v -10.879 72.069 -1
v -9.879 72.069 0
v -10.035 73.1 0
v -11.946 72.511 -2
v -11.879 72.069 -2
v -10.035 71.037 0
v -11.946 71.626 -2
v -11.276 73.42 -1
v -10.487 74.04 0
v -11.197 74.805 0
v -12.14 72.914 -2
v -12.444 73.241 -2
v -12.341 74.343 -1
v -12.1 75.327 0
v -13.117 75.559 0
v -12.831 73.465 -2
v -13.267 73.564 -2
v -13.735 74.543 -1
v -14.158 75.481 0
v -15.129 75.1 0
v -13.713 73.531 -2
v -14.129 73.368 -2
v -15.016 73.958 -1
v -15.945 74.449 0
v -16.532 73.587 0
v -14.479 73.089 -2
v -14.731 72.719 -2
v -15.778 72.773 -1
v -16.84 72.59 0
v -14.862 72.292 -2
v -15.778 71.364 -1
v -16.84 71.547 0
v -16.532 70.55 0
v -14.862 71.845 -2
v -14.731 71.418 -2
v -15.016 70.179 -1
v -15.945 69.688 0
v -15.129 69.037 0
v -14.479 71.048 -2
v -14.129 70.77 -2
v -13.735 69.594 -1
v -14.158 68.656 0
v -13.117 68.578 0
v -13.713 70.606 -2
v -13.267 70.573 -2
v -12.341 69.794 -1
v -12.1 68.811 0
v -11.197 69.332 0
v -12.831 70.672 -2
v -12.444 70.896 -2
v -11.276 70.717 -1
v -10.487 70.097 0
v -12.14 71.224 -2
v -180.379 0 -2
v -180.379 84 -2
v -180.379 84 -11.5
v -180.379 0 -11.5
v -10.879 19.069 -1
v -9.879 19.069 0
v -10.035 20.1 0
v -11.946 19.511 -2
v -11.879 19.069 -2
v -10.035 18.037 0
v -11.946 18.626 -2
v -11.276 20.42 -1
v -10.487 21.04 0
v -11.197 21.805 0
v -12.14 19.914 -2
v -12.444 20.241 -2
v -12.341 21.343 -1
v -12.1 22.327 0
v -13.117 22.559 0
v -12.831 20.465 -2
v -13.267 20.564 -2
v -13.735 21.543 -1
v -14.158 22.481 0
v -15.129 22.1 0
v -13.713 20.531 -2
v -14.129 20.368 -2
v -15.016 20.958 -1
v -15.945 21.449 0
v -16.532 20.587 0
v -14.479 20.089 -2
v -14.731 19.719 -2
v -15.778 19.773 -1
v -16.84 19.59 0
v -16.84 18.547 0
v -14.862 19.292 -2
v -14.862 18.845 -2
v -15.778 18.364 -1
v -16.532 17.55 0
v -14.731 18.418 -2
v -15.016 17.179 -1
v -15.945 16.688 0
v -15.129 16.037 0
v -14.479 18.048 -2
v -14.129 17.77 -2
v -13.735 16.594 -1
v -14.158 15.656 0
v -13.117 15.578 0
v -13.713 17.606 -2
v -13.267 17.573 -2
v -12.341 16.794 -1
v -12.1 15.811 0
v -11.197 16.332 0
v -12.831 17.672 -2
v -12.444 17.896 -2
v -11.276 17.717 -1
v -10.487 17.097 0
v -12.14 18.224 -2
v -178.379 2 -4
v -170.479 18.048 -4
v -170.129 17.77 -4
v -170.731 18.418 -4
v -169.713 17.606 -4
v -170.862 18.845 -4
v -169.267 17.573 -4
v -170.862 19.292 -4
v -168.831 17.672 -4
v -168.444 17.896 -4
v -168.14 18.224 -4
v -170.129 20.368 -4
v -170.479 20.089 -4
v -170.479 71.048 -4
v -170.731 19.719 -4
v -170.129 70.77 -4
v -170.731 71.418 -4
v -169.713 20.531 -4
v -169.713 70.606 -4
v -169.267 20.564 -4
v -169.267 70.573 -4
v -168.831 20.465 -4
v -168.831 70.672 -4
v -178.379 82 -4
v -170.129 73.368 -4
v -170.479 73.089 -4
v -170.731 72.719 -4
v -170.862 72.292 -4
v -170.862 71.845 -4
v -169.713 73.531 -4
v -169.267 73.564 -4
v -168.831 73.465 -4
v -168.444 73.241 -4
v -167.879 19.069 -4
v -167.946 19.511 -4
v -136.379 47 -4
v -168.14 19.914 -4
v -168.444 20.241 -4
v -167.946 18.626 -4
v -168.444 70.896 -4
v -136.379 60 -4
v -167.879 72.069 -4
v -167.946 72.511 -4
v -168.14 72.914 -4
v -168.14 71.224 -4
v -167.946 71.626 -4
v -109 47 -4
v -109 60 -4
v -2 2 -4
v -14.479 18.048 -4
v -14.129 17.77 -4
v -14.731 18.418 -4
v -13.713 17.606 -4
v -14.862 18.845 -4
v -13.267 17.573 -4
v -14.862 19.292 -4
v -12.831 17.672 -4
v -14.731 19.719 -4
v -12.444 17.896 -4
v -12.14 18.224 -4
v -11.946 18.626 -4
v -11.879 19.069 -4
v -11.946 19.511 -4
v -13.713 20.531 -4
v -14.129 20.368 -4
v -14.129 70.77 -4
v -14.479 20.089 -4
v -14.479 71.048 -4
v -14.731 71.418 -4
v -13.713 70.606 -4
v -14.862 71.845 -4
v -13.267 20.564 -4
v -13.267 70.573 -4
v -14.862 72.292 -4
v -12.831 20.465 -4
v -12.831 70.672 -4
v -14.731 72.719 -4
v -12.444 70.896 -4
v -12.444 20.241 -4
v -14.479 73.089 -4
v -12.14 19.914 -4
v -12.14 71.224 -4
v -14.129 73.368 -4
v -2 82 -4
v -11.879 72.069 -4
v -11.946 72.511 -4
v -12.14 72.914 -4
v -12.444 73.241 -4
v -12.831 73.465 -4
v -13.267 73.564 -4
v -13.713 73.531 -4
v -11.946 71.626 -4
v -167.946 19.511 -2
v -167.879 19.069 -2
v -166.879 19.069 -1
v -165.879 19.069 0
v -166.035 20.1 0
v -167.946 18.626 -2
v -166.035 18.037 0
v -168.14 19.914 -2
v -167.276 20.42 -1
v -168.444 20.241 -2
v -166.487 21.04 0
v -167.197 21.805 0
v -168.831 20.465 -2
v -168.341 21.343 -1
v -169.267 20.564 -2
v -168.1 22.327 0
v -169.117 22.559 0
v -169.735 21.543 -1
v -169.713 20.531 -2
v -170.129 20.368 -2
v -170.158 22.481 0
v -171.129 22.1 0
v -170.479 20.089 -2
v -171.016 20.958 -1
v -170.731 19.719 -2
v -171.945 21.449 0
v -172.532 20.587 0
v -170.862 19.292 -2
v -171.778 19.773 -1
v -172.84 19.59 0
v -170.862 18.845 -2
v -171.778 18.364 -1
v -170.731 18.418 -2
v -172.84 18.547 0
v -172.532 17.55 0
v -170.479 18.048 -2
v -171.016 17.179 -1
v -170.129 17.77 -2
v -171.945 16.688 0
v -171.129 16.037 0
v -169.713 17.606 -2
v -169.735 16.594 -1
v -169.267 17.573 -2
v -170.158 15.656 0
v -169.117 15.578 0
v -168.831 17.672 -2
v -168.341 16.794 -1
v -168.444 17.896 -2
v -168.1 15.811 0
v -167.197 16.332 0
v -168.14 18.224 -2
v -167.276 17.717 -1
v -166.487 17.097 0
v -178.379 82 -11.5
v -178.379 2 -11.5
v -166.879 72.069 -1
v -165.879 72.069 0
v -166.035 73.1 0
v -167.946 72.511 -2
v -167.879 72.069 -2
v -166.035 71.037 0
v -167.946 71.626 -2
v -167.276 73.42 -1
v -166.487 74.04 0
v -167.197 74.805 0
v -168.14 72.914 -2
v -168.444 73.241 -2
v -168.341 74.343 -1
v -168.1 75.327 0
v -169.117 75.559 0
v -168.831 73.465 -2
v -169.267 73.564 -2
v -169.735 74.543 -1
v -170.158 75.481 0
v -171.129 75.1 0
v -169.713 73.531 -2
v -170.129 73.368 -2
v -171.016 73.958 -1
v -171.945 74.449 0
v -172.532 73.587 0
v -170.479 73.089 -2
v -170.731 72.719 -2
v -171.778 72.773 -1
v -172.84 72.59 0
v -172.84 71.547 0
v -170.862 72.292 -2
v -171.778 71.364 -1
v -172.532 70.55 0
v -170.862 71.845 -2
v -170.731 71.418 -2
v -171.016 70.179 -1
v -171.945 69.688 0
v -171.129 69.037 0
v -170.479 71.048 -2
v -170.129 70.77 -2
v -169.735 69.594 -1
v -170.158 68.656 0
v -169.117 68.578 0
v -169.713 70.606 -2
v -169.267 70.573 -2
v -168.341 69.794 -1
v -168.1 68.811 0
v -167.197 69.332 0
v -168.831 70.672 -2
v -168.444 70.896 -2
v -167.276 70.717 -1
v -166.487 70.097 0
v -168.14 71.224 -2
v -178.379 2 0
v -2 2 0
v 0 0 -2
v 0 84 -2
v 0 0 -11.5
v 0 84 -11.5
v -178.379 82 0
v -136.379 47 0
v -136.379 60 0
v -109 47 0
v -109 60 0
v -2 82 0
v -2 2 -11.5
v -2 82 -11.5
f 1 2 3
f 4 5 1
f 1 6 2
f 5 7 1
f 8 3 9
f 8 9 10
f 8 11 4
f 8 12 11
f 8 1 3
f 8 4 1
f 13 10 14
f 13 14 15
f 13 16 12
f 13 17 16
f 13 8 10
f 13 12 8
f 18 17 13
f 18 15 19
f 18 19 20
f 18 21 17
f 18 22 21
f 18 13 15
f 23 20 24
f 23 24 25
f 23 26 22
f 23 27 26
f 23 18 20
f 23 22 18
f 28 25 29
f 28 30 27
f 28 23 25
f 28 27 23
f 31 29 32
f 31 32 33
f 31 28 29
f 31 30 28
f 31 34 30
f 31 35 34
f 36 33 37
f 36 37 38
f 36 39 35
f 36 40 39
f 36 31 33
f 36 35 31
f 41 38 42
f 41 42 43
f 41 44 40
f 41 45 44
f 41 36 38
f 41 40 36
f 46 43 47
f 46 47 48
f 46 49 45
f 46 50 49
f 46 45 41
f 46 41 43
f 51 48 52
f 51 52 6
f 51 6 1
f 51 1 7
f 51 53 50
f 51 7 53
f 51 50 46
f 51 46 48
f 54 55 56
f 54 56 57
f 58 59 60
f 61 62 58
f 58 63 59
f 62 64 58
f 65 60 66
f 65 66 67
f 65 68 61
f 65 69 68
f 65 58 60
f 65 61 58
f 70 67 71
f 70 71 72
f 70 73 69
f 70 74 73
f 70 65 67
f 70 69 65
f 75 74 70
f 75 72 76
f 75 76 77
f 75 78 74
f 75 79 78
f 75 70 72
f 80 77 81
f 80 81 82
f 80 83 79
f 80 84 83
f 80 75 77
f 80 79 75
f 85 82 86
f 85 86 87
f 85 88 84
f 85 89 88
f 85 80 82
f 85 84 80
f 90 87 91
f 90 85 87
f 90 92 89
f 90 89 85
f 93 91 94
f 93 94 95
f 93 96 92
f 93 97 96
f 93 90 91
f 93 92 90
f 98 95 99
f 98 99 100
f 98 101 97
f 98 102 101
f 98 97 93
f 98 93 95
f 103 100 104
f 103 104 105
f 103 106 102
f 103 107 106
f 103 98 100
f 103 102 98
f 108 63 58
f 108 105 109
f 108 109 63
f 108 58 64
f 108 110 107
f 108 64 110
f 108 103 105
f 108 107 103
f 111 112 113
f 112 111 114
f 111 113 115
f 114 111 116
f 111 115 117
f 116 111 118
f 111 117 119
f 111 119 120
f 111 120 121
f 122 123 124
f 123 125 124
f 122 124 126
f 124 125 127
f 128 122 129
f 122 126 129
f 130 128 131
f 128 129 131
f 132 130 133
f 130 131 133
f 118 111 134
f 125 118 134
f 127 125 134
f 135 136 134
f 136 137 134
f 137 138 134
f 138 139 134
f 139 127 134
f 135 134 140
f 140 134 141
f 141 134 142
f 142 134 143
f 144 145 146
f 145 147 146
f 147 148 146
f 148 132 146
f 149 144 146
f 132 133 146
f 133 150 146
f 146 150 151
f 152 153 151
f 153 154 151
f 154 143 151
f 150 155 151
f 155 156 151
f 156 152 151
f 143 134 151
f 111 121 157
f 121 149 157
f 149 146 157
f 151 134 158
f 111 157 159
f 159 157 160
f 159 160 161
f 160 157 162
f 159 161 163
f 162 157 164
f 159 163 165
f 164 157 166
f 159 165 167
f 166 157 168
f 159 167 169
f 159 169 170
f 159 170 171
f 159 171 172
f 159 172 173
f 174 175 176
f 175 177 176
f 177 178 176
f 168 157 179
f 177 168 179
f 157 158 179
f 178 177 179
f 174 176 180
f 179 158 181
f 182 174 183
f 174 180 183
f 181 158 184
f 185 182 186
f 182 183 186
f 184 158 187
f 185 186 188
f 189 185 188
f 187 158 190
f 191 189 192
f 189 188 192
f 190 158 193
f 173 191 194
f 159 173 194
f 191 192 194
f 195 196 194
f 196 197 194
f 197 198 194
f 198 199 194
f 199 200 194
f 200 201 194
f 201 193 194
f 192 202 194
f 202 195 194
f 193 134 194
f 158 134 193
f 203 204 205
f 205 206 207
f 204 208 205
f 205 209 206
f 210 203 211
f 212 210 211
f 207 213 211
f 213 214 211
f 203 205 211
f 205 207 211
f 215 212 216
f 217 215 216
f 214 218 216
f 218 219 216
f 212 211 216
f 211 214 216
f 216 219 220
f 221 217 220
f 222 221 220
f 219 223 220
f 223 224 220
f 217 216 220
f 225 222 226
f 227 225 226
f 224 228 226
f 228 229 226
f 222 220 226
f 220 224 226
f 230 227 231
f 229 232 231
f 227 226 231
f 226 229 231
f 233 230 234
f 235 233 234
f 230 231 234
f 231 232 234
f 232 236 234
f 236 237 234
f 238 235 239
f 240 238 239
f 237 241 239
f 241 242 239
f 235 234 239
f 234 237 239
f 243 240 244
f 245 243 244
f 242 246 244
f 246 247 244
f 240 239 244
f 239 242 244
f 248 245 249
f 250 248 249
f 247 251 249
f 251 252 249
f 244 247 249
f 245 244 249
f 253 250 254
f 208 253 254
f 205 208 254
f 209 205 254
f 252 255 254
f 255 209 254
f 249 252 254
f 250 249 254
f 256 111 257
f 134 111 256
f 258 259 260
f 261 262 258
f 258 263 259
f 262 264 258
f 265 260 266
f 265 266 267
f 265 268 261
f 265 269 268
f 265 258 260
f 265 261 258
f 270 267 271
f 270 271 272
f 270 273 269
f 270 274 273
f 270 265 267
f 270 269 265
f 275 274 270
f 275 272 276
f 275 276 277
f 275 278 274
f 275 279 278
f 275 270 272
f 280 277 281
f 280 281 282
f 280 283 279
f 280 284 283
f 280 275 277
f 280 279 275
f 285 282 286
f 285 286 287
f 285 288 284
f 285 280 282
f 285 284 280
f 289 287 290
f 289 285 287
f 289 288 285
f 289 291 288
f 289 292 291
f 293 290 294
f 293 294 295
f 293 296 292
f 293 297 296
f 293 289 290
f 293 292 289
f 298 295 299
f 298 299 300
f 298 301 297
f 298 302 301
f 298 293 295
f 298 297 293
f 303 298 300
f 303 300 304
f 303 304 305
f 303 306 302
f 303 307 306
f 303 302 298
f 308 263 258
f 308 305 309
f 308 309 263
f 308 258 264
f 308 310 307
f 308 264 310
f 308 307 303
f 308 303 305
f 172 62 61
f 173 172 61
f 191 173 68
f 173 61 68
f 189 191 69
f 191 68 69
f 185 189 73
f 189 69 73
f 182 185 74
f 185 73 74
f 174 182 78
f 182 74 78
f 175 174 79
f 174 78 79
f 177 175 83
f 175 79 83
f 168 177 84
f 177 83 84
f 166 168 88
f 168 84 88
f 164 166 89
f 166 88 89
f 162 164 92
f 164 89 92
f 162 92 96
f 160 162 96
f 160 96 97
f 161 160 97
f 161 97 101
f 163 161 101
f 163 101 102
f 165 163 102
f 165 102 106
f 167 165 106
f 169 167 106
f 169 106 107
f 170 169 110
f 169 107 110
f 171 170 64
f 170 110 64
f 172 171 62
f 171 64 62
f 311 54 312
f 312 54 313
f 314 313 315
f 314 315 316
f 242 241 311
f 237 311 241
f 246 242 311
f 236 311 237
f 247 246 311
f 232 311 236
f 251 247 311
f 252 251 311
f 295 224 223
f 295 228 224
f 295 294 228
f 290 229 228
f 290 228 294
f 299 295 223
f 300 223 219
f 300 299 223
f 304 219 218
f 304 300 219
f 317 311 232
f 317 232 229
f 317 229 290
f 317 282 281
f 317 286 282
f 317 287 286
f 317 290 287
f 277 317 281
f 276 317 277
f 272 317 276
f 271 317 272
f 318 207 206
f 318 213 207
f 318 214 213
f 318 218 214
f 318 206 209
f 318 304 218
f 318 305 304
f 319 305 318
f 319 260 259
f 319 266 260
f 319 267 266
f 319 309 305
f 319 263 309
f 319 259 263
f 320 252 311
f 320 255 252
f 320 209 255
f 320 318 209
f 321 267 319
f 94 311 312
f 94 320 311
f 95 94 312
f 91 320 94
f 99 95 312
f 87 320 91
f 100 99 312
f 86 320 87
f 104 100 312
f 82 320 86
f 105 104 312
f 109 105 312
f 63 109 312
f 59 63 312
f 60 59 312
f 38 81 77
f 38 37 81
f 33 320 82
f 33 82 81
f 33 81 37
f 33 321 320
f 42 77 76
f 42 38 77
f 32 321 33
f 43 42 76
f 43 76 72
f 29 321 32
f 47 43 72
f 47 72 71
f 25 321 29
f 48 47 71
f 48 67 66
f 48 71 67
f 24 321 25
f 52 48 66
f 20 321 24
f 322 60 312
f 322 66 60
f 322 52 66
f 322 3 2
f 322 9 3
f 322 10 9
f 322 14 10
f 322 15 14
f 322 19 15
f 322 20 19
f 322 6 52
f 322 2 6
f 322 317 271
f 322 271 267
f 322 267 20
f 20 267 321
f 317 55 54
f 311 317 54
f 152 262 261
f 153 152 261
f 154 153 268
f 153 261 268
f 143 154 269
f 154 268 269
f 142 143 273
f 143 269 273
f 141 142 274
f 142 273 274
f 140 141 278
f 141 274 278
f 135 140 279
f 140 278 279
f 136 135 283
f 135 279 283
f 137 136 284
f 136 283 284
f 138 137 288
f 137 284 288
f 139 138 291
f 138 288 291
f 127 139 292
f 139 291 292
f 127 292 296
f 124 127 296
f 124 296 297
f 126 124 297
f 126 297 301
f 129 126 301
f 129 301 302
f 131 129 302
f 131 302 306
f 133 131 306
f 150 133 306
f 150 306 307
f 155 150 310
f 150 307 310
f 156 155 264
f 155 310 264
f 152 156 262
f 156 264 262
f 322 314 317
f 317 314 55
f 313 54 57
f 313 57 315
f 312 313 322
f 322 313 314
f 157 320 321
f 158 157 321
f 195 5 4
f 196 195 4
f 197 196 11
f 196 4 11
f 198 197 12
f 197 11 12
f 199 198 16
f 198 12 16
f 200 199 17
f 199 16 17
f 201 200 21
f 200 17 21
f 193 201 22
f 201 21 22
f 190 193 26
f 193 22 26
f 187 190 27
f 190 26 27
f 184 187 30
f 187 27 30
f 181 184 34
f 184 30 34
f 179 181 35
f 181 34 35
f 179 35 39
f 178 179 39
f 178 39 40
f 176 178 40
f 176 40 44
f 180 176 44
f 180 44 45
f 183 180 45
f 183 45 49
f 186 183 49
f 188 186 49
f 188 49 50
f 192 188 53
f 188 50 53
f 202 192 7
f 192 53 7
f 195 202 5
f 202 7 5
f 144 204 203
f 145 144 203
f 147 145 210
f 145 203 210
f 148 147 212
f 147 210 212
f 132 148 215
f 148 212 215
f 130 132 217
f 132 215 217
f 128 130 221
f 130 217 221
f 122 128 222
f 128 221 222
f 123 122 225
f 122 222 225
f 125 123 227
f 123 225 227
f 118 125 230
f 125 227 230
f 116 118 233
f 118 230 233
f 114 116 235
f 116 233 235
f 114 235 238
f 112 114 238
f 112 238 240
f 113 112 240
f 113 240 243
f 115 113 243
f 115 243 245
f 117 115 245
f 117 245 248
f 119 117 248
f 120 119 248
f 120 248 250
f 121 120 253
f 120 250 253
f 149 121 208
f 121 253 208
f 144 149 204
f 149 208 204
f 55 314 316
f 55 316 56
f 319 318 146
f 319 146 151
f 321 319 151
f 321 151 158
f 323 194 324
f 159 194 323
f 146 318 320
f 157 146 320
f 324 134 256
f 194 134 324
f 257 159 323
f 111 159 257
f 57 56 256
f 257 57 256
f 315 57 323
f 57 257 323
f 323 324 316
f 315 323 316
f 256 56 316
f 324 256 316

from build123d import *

# Parameters (mm, degrees)
F1_DEPTH = 11.5
F0_R     = 1.5
F2_DEPTH = 4
F3_SIZE  = 2
F4_W     = 27.3790522566
F4_H     = 13
F5_DEPTH = 25


# Not quite as in the source:
# - a feature names something its author has since deleted; it is built from what else it names


with BuildPart() as f1:
    # F0 (on Top) → F1 (new body)
    with BuildSketch(Plane.XY):
        Polygon((-180.3790522566, 0), (0, 0), (0, 42), (0, 84), (-180.3790522566, 84), align=None)
        Polygon((-2, 82), (-2, 42), (-2, 2), (-35, 2), (-178.3790522566, 2), (-178.3790522566, 82), (-35, 82), align=None, mode=Mode.SUBTRACT)
    extrude(amount=-F1_DEPTH)

    # F0 (on Top) → F2 (join)
    with BuildSketch(Plane.XY):
        Polygon((-35, 76.0685783849), (-35, 82), (-178.3790522566, 82), (-178.3790522566, 2), (-35, 2), (-35, 15.0685783849), (-63, 15.0685783849), (-173.3790522566, 15.0685783849), (-173.3790522566, 76.0685783849), align=None)
        with BuildLine():
            Line((-35, 63), (-35, 76.0685783849))
            Line((-35, 76.0685783849), (-173.3790522566, 76.0685783849))
            Line((-173.3790522566, 76.0685783849), (-173.3790522566, 15.0685783849))
            Line((-173.3790522566, 15.0685783849), (-63, 15.0685783849))
            Line((-63, 15.0685783849), (-63, 21.5))
            Line((-63, 21.5), (-163, 21.5))
            Line((-163, 21.5), (-163, 62.5))
            Line((-163, 62.5), (-63, 62.5))
            Line((-63, 62.5), (-63, 42))
            Line((-63, 42), (-56, 42))
            ThreePointArc((-56, 42), (-51, 47), (-46, 42))
            Line((-46, 42), (-40, 42))
            ThreePointArc((-40, 42), (-38.5355339059, 45.5355339059), (-35, 47))
            Line((-35, 47), (-35, 53))
            ThreePointArc((-35, 53), (-40, 58), (-35, 63))
        make_face()
        with Locations((-169.3790522566, 19.0685783849)):
            Circle(F0_R, mode=Mode.SUBTRACT)
        with Locations((-169.3790522566, 72.0685783849)):
            Circle(F0_R, mode=Mode.SUBTRACT)
        with BuildLine():
            Line((-14, 42), (-9.3790522566, 42))
            Line((-9.3790522566, 42), (-9.3790522566, 76.0685783849))
            Line((-9.3790522566, 76.0685783849), (-35, 76.0685783849))
            Line((-35, 76.0685783849), (-35, 63))
            ThreePointArc((-35, 63), (-31.4644660941, 61.5355339059), (-30, 58))
            ThreePointArc((-30, 58), (-31.4644660941, 54.4644660941), (-35, 53))
            Line((-35, 53), (-35, 47))
            ThreePointArc((-35, 47), (-31.4644660941, 45.5355339059), (-30, 42))
            Line((-30, 42), (-24, 42))
            ThreePointArc((-24, 42), (-19, 47), (-14, 42))
        make_face()
        with Locations((-13.3790522566, 72.0685783849)):
            Circle(F0_R, mode=Mode.SUBTRACT)
        Polygon((-9.3790522566, 42), (-2, 42), (-2, 82), (-35, 82), (-35, 76.0685783849), (-9.3790522566, 76.0685783849), align=None)
        Polygon((-2, 2), (-2, 42), (-9.3790522566, 42), (-9.3790522566, 15.0685783849), (-35, 15.0685783849), (-35, 2), align=None)
        with BuildLine():
            Line((-9.3790522566, 15.0685783849), (-9.3790522566, 42))
            Line((-9.3790522566, 42), (-14, 42))
            ThreePointArc((-14, 42), (-19, 37), (-24, 42))
            Line((-24, 42), (-30, 42))
            ThreePointArc((-30, 42), (-31.4644660941, 38.4644660941), (-35, 37))
            Line((-35, 37), (-35, 31))
            ThreePointArc((-35, 31), (-31.4644660941, 29.5355339059), (-30, 26))
            ThreePointArc((-30, 26), (-31.4644660941, 22.4644660941), (-35, 21))
            Line((-35, 21), (-35, 15.0685783849))
            Line((-35, 15.0685783849), (-9.3790522566, 15.0685783849))
        make_face()
        with Locations((-13.3790522566, 19.0685783849)):
            Circle(F0_R, mode=Mode.SUBTRACT)
        with BuildLine():
            Line((-63, 15.0685783849), (-35, 15.0685783849))
            Line((-35, 15.0685783849), (-35, 21))
            ThreePointArc((-35, 21), (-40, 26), (-35, 31))
            Line((-35, 31), (-35, 37))
            ThreePointArc((-35, 37), (-38.5355339059, 38.4644660941), (-40, 42))
            Line((-40, 42), (-46, 42))
            ThreePointArc((-46, 42), (-51, 37), (-56, 42))
            Line((-56, 42), (-63, 42))
            Line((-63, 42), (-63, 21.5))
            Line((-63, 21.5), (-63, 15.0685783849))
        make_face()
        with BuildLine():
            Line((-46, 42), (-56, 42))
            ThreePointArc((-56, 42), (-51, 37), (-46, 42))
        make_face()
        with BuildLine():
            ThreePointArc((-46, 42), (-51, 47), (-56, 42))
            Line((-56, 42), (-46, 42))
        make_face()
        with BuildLine():
            ThreePointArc((-35, 37), (-31.4644660941, 38.4644660941), (-30, 42))
            Line((-30, 42), (-35, 42))
            Line((-35, 42), (-35, 37))
        make_face()
        with BuildLine():
            Line((-35, 42), (-30, 42))
            ThreePointArc((-30, 42), (-31.4644660941, 45.5355339059), (-35, 47))
            Line((-35, 47), (-35, 42))
        make_face()
        with BuildLine():
            ThreePointArc((-40, 42), (-38.5355339059, 38.4644660941), (-35, 37))
            Line((-35, 37), (-35, 42))
            Line((-35, 42), (-40, 42))
        make_face()
        with BuildLine():
            Line((-35, 42), (-35, 47))
            ThreePointArc((-35, 47), (-38.5355339059, 45.5355339059), (-40, 42))
            Line((-40, 42), (-35, 42))
        make_face()
        with BuildLine():
            ThreePointArc((-24, 42), (-19, 37), (-14, 42))
            Line((-14, 42), (-24, 42))
        make_face()
        with BuildLine():
            Line((-24, 42), (-14, 42))
            ThreePointArc((-14, 42), (-19, 47), (-24, 42))
        make_face()
        with BuildLine():
            ThreePointArc((-30, 58), (-31.4644660941, 61.5355339059), (-35, 63))
            Line((-35, 63), (-35, 58))
            Line((-35, 58), (-35, 53))
            ThreePointArc((-35, 53), (-31.4644660941, 54.4644660941), (-30, 58))
        make_face()
        with BuildLine():
            Line((-35, 58), (-35, 63))
            ThreePointArc((-35, 63), (-40, 58), (-35, 53))
            Line((-35, 53), (-35, 58))
        make_face()
        with BuildLine():
            Line((-35, 26), (-35, 21))
            ThreePointArc((-35, 21), (-31.4644660941, 22.4644660941), (-30, 26))
            ThreePointArc((-30, 26), (-31.4644660941, 29.5355339059), (-35, 31))
            Line((-35, 31), (-35, 26))
        make_face()
        with BuildLine():
            ThreePointArc((-35, 31), (-40, 26), (-35, 21))
            Line((-35, 21), (-35, 26))
            Line((-35, 26), (-35, 31))
        make_face()
        Polygon((-163, 21.5), (-63, 21.5), (-63, 42), (-63, 62.5), (-163, 62.5), align=None)
    extrude(amount=-F2_DEPTH)

    # F3
    f3_edges = [f1.edges().sort_by_distance(p)[0] for p in [
        (-90.189526, 84, 0),
        (0, 42, 0),
        (-90.189526, 0, 0),
        (-180.379052, 42, 0),
        (-170.879052, 19.068578, 0),
        (-14.879052, 72.068578, 0),
        (-14.879052, 19.068578, 0),
        (-170.879052, 72.068578, 0),
    ]]
    chamfer(f3_edges, length=F3_SIZE)

    # F4 (on face) → F5 (cut)
    with BuildSketch(Plane.XY):
        with Locations((-122.6895261283, 53.5)):
            Rectangle(F4_W, F4_H)
    extrude(amount=-F5_DEPTH, mode=Mode.SUBTRACT)


solid = f1.part
